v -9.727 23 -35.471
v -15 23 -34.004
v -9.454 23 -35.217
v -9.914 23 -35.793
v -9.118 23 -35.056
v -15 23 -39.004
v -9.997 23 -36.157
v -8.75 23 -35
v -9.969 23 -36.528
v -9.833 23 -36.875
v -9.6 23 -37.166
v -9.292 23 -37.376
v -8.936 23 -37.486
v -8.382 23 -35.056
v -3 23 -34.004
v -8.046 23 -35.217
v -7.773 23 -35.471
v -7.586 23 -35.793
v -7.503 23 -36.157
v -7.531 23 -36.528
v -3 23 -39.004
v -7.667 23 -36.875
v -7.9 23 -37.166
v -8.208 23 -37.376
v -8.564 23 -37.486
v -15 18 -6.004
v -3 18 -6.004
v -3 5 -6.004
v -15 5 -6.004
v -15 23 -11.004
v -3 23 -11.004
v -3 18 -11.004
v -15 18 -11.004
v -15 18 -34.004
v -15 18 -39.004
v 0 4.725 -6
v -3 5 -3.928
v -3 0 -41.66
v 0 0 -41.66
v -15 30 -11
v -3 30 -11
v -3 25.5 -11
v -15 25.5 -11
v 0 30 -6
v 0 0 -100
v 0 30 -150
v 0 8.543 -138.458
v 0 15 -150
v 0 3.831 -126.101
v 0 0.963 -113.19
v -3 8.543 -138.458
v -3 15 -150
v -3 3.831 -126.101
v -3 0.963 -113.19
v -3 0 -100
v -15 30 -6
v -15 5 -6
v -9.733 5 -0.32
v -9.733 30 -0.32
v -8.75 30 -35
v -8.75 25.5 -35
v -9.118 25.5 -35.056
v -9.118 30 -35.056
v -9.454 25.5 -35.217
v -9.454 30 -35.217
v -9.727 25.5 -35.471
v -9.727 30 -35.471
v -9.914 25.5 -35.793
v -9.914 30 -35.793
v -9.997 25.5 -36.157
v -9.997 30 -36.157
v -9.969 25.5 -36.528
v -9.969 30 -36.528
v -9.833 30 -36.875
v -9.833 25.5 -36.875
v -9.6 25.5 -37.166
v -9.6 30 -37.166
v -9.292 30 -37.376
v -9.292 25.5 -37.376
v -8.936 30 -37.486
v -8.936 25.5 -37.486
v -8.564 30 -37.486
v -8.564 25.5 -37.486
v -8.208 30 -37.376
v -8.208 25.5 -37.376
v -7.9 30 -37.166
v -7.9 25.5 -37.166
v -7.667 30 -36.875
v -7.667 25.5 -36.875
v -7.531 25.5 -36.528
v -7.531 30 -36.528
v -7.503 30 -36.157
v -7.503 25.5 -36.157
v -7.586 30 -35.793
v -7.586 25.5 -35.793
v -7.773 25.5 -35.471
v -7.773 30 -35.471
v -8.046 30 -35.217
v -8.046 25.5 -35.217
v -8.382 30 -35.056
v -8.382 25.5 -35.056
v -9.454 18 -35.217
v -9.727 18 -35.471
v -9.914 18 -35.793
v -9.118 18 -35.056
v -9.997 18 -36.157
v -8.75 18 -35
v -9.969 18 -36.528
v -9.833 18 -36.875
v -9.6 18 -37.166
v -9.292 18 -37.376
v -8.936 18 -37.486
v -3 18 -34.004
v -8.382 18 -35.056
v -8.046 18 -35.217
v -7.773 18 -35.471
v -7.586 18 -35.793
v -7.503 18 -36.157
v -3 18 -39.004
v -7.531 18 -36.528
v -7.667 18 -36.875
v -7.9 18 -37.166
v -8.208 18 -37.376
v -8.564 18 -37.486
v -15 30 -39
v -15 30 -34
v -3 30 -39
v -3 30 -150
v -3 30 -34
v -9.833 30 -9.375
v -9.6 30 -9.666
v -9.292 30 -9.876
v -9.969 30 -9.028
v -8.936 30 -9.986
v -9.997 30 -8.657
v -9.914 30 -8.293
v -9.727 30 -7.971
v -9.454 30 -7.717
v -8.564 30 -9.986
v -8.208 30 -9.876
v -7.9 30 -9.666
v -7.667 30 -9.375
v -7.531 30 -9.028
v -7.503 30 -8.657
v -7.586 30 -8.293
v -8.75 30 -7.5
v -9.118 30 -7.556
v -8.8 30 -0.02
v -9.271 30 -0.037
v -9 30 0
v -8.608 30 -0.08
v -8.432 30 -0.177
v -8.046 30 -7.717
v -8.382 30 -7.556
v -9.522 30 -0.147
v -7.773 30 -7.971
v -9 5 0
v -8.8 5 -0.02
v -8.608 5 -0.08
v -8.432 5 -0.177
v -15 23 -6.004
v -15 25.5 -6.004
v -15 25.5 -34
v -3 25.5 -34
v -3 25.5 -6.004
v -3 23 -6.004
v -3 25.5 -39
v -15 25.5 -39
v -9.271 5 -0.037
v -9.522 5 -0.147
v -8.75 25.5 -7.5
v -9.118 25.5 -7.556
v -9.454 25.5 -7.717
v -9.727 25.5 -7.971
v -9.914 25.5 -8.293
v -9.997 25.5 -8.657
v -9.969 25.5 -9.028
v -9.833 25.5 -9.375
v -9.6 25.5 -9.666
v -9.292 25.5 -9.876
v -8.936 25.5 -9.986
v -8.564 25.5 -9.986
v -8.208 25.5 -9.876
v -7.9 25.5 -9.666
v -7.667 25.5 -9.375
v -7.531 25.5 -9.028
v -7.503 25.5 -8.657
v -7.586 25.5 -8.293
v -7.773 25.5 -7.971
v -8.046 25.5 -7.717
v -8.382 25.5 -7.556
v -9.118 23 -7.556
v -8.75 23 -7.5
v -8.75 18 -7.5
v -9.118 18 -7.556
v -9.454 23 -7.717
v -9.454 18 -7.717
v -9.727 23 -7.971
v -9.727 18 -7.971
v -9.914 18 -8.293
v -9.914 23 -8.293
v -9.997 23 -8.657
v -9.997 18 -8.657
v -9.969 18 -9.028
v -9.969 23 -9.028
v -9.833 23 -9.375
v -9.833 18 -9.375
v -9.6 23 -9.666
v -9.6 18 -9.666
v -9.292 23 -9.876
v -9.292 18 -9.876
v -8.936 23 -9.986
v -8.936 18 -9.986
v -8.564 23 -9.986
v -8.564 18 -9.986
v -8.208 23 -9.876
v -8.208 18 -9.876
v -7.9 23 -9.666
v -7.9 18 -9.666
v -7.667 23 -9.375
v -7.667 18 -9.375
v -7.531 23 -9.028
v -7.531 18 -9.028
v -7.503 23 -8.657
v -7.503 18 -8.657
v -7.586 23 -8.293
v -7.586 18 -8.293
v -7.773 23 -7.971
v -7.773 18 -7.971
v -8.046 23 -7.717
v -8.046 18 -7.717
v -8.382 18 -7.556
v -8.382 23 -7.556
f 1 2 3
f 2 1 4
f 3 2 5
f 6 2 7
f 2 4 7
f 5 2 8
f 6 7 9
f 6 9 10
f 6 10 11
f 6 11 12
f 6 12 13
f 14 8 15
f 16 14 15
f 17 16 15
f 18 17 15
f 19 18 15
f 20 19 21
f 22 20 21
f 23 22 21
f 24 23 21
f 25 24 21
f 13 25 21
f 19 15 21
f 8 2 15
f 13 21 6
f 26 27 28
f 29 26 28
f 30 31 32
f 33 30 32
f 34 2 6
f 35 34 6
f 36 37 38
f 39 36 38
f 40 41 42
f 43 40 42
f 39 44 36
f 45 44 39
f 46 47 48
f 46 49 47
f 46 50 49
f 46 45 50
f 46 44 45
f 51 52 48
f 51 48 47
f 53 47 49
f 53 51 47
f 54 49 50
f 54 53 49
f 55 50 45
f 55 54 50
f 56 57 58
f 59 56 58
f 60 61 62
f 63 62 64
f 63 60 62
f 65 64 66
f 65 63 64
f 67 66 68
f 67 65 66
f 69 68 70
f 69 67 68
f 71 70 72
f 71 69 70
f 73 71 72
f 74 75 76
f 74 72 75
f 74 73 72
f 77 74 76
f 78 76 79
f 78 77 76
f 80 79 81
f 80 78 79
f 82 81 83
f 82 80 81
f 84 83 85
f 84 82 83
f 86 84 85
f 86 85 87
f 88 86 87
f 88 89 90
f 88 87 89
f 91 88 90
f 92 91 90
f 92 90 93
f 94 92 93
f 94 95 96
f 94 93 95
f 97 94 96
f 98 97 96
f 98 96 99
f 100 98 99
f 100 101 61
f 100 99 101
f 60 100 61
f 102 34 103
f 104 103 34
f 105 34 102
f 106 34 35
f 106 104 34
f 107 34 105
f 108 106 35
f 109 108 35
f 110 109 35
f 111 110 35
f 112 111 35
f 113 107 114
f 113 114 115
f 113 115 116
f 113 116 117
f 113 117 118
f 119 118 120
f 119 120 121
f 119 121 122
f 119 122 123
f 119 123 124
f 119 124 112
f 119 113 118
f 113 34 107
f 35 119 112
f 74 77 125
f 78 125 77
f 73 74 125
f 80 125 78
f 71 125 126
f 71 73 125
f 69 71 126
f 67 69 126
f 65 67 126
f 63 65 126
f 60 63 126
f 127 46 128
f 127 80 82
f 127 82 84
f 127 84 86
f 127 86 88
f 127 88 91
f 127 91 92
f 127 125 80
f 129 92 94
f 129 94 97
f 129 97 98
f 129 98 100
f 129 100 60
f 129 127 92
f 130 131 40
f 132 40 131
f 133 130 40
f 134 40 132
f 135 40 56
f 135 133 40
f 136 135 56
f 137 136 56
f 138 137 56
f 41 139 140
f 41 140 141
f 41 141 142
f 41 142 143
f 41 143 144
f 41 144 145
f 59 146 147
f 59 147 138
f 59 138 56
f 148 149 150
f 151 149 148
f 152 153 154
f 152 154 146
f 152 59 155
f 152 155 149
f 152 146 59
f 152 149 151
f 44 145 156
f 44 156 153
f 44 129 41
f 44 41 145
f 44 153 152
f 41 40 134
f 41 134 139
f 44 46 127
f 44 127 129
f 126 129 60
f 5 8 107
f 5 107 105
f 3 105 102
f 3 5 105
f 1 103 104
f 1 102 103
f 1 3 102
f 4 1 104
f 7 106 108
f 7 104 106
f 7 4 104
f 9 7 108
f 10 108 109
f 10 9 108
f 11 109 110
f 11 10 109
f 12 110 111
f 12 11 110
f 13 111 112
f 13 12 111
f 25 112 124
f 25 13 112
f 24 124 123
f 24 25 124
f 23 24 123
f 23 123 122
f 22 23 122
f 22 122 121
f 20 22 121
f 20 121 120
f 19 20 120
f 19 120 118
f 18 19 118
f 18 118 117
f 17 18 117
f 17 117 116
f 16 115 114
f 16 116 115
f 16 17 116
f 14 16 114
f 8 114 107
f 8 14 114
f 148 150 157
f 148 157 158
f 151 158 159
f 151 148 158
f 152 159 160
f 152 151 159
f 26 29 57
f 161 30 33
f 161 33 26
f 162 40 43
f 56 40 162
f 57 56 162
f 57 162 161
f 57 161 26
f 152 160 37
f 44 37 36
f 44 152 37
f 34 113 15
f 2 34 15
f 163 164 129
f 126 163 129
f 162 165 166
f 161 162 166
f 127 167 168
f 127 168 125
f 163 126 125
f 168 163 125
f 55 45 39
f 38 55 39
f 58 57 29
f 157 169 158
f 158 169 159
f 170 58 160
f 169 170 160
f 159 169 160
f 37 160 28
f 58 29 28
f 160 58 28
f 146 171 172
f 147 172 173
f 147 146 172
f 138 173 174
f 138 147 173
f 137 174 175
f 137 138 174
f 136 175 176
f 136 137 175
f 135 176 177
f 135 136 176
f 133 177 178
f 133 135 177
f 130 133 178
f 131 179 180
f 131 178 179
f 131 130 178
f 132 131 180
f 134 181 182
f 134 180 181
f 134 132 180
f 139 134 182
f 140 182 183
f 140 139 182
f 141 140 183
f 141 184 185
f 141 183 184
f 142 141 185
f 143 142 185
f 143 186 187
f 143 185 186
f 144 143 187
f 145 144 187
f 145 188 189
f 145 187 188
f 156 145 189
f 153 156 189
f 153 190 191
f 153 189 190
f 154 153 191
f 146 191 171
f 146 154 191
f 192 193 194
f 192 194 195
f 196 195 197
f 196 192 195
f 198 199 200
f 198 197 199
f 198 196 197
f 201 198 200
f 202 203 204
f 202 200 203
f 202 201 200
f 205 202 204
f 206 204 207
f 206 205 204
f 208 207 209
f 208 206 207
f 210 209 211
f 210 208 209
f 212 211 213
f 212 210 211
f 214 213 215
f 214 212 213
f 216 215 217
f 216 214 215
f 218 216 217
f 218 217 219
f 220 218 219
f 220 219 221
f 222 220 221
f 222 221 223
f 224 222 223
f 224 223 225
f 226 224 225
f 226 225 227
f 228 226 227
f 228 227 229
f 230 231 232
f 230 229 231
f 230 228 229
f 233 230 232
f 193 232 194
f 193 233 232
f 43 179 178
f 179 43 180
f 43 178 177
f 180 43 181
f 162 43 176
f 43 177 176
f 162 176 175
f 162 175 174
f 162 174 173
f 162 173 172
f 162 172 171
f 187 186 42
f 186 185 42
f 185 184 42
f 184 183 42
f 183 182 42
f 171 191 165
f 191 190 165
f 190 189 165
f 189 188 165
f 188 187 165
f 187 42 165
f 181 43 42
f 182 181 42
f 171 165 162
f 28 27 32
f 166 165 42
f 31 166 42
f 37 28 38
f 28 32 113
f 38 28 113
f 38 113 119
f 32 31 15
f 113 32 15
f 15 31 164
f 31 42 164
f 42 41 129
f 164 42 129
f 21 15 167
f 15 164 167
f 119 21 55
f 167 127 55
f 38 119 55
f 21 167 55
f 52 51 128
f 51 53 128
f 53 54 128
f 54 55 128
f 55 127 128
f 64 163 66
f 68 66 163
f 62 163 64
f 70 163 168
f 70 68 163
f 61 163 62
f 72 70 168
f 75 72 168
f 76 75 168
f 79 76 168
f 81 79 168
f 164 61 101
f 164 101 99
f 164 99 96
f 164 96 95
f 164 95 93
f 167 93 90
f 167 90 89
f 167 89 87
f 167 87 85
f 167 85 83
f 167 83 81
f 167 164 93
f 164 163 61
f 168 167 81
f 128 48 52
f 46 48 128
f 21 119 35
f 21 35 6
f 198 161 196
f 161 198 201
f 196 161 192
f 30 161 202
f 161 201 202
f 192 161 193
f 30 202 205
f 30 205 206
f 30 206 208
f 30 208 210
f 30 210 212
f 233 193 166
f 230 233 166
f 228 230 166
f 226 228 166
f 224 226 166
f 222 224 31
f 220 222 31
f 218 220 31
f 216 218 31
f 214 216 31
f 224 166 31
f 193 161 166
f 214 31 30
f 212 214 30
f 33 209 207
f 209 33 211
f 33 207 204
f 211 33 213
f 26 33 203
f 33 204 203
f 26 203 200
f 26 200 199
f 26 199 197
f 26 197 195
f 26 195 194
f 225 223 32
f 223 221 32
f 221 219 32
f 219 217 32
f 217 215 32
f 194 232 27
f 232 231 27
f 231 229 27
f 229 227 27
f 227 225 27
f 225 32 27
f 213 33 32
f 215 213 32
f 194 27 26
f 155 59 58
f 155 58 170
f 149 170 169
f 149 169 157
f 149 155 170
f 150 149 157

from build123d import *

# Parameters (mm, degrees)
SKETCH_1_W          = 150
SKETCH_1_H          = 30
EXTRUDE_1_DEPTH     = 3
SKETCH_2_W          = 5
SKETCH_2_H          = 4.5
SKETCH_2_H_2        = 5
EXTRUDE_2_DEPTH     = 12
SKETCH_3_R          = 1.25
CUT_EXTRUDE_1_DEPTH = 12
CUT_EXTRUDE_2_DEPTH = 33
SKETCH_6_W          = 12
SKETCH_6_H          = 5
CUT_EXTRUDE_3_DEPTH = 14
CUT_EXTRUDE_4_DEPTH = 14
CUT_EXTRUDE_5_DEPTH = 14
SKETCH_9_W          = 52.537386277
SKETCH_9_H          = 169.005460475
CUT_EXTRUDE_6_DEPTH = 39


with BuildPart() as part:
    # 草图1 → 凸台-拉伸1 (new body)
    with BuildSketch(Plane(origin=(0, 0, 0), x_dir=(0, 0, -1), z_dir=(1, 0, 0))):
        with Locations((75, 15)):
            Rectangle(SKETCH_1_W, SKETCH_1_H)
    extrude_1 = extrude(amount=EXTRUDE_1_DEPTH)

    # 草图2 → 凸台-拉伸2 (add)
    with BuildSketch(Plane(origin=(3, 0, 0), x_dir=(0, 0, -1), z_dir=(1, 0, 0))):
        Polygon((6, 30), (11, 30), (11, 25.500001474), (6.003642258, 25.500001474), (6.003642258, 23.000001474), (11.003642258, 23.000001474), (11.003642258, 18.000001474), (6.003642258, 18.000001474), (6.003642258, 0), (0, 0), (0, 30), align=None)
        with Locations((36.5, 27.75)):
            Rectangle(SKETCH_2_W, SKETCH_2_H)
        with Locations((36.503642258, 20.500001474)):
            Rectangle(SKETCH_2_W, SKETCH_2_H_2)
    extrude_2 = extrude(amount=EXTRUDE_2_DEPTH)

    # 草图3 → 切除-拉伸1 (cut)
    with BuildSketch(Plane(origin=(0, 30, 0), x_dir=(1, 0, 0), z_dir=(0, 1, 0))):
        with Locations(Location((8.75, 36.25, 0), (0, 0, 270))):
            Circle(SKETCH_3_R)
        with Locations(Location((8.75, 8.75, 0), (0, 0, 270))):
            Circle(SKETCH_3_R)
    cut_extrude_1 = extrude(amount=-CUT_EXTRUDE_1_DEPTH, mode=Mode.SUBTRACT)

    # 草图5 → 切除-拉伸2 (cut)
    with BuildSketch(Plane(origin=(0, 30, 0), x_dir=(1, 0, 0), z_dir=(0, 1, 0))):
        with BuildLine():
            Line((0, 0), (9, 0))
            ThreePointArc((9, 0), (8.702388097, 0.045313059), (8.431747605, 0.17714569))
            Line((8.431747605, 0.17714569), (0, 6))
            Line((0, 6), (0, 0))
        make_face()
        with BuildLine():
            Line((15, 0), (15, 6))
            Line((15, 6), (9.733275958, 0.32006885))
            ThreePointArc((9.733275958, 0.32006885), (9.400043029, 0.083503642), (9, 0))
            Line((9, 0), (15, 0))
        make_face()
    cut_extrude_2 = extrude(amount=-CUT_EXTRUDE_2_DEPTH, mode=Mode.SUBTRACT)

    # 草图6 → 切除-拉伸3 (cut)
    with BuildSketch(Plane(origin=(0, 0, -6.003642258), x_dir=(-1, 0, 0), z_dir=(0, 0, -1))):
        with Locations((-9, 2.5)):
            Rectangle(SKETCH_6_W, SKETCH_6_H)
    cut_extrude_3 = extrude(amount=-CUT_EXTRUDE_3_DEPTH, mode=Mode.SUBTRACT)

    # 草图7 → 切除-拉伸4 (cut)
    with BuildSketch(Plane(origin=(3, 0, 0), x_dir=(0, 0, -1), z_dir=(1, 0, 0))):
        Polygon((41.659631445, 0), (3.928239346, 0), (3.928239346, 5), align=None)
    cut_extrude_4 = extrude(amount=-CUT_EXTRUDE_4_DEPTH, mode=Mode.SUBTRACT)

    # 草图8 → 切除-拉伸5 (cut)
    with BuildSketch(Plane(origin=(3, 0, 0), x_dir=(0, 0, -1), z_dir=(1, 0, 0))):
        with BuildLine():
            Line((100, 0), (150, 0))
            Line((150, 0), (150, 15))
            ThreePointArc((150, 15), (126.100766272, 3.830779092), (100, 0))
        make_face()
    cut_extrude_5 = extrude(amount=-CUT_EXTRUDE_5_DEPTH, mode=Mode.SUBTRACT)

    # 镜向2: 凸台-拉伸1, 凸台-拉伸2, 切除-拉伸1, 切除-拉伸2, 切除-拉伸3, 切除-拉伸4, 切除-拉伸5 across plane
    add(extrude_1.mirror(Plane(origin=(0, 0, 0), x_dir=(0, 0, 1), z_dir=(1, 0, 0))))
    add(extrude_2.mirror(Plane(origin=(0, 0, 0), x_dir=(0, 0, 1), z_dir=(1, 0, 0))))
    add(cut_extrude_1.mirror(Plane(origin=(0, 0, 0), x_dir=(0, 0, 1), z_dir=(1, 0, 0))), mode=Mode.SUBTRACT)
    add(cut_extrude_2.mirror(Plane(origin=(0, 0, 0), x_dir=(0, 0, 1), z_dir=(1, 0, 0))), mode=Mode.SUBTRACT)
    add(cut_extrude_3.mirror(Plane(origin=(0, 0, 0), x_dir=(0, 0, 1), z_dir=(1, 0, 0))), mode=Mode.SUBTRACT)
    add(cut_extrude_4.mirror(Plane(origin=(0, 0, 0), x_dir=(0, 0, 1), z_dir=(1, 0, 0))), mode=Mode.SUBTRACT)
    add(cut_extrude_5.mirror(Plane(origin=(0, 0, 0), x_dir=(0, 0, 1), z_dir=(1, 0, 0))), mode=Mode.SUBTRACT)

    # 草图9 → 切除-拉伸6 (cut)
    with BuildSketch(Plane(origin=(0, 30, 0), x_dir=(1, 0, 0), z_dir=(0, 1, 0))):
        with Locations((26.268693139, 84.502730238)):
            Rectangle(SKETCH_9_W, SKETCH_9_H)
    extrude(amount=-CUT_EXTRUDE_6_DEPTH, mode=Mode.SUBTRACT)


solid = part.part
